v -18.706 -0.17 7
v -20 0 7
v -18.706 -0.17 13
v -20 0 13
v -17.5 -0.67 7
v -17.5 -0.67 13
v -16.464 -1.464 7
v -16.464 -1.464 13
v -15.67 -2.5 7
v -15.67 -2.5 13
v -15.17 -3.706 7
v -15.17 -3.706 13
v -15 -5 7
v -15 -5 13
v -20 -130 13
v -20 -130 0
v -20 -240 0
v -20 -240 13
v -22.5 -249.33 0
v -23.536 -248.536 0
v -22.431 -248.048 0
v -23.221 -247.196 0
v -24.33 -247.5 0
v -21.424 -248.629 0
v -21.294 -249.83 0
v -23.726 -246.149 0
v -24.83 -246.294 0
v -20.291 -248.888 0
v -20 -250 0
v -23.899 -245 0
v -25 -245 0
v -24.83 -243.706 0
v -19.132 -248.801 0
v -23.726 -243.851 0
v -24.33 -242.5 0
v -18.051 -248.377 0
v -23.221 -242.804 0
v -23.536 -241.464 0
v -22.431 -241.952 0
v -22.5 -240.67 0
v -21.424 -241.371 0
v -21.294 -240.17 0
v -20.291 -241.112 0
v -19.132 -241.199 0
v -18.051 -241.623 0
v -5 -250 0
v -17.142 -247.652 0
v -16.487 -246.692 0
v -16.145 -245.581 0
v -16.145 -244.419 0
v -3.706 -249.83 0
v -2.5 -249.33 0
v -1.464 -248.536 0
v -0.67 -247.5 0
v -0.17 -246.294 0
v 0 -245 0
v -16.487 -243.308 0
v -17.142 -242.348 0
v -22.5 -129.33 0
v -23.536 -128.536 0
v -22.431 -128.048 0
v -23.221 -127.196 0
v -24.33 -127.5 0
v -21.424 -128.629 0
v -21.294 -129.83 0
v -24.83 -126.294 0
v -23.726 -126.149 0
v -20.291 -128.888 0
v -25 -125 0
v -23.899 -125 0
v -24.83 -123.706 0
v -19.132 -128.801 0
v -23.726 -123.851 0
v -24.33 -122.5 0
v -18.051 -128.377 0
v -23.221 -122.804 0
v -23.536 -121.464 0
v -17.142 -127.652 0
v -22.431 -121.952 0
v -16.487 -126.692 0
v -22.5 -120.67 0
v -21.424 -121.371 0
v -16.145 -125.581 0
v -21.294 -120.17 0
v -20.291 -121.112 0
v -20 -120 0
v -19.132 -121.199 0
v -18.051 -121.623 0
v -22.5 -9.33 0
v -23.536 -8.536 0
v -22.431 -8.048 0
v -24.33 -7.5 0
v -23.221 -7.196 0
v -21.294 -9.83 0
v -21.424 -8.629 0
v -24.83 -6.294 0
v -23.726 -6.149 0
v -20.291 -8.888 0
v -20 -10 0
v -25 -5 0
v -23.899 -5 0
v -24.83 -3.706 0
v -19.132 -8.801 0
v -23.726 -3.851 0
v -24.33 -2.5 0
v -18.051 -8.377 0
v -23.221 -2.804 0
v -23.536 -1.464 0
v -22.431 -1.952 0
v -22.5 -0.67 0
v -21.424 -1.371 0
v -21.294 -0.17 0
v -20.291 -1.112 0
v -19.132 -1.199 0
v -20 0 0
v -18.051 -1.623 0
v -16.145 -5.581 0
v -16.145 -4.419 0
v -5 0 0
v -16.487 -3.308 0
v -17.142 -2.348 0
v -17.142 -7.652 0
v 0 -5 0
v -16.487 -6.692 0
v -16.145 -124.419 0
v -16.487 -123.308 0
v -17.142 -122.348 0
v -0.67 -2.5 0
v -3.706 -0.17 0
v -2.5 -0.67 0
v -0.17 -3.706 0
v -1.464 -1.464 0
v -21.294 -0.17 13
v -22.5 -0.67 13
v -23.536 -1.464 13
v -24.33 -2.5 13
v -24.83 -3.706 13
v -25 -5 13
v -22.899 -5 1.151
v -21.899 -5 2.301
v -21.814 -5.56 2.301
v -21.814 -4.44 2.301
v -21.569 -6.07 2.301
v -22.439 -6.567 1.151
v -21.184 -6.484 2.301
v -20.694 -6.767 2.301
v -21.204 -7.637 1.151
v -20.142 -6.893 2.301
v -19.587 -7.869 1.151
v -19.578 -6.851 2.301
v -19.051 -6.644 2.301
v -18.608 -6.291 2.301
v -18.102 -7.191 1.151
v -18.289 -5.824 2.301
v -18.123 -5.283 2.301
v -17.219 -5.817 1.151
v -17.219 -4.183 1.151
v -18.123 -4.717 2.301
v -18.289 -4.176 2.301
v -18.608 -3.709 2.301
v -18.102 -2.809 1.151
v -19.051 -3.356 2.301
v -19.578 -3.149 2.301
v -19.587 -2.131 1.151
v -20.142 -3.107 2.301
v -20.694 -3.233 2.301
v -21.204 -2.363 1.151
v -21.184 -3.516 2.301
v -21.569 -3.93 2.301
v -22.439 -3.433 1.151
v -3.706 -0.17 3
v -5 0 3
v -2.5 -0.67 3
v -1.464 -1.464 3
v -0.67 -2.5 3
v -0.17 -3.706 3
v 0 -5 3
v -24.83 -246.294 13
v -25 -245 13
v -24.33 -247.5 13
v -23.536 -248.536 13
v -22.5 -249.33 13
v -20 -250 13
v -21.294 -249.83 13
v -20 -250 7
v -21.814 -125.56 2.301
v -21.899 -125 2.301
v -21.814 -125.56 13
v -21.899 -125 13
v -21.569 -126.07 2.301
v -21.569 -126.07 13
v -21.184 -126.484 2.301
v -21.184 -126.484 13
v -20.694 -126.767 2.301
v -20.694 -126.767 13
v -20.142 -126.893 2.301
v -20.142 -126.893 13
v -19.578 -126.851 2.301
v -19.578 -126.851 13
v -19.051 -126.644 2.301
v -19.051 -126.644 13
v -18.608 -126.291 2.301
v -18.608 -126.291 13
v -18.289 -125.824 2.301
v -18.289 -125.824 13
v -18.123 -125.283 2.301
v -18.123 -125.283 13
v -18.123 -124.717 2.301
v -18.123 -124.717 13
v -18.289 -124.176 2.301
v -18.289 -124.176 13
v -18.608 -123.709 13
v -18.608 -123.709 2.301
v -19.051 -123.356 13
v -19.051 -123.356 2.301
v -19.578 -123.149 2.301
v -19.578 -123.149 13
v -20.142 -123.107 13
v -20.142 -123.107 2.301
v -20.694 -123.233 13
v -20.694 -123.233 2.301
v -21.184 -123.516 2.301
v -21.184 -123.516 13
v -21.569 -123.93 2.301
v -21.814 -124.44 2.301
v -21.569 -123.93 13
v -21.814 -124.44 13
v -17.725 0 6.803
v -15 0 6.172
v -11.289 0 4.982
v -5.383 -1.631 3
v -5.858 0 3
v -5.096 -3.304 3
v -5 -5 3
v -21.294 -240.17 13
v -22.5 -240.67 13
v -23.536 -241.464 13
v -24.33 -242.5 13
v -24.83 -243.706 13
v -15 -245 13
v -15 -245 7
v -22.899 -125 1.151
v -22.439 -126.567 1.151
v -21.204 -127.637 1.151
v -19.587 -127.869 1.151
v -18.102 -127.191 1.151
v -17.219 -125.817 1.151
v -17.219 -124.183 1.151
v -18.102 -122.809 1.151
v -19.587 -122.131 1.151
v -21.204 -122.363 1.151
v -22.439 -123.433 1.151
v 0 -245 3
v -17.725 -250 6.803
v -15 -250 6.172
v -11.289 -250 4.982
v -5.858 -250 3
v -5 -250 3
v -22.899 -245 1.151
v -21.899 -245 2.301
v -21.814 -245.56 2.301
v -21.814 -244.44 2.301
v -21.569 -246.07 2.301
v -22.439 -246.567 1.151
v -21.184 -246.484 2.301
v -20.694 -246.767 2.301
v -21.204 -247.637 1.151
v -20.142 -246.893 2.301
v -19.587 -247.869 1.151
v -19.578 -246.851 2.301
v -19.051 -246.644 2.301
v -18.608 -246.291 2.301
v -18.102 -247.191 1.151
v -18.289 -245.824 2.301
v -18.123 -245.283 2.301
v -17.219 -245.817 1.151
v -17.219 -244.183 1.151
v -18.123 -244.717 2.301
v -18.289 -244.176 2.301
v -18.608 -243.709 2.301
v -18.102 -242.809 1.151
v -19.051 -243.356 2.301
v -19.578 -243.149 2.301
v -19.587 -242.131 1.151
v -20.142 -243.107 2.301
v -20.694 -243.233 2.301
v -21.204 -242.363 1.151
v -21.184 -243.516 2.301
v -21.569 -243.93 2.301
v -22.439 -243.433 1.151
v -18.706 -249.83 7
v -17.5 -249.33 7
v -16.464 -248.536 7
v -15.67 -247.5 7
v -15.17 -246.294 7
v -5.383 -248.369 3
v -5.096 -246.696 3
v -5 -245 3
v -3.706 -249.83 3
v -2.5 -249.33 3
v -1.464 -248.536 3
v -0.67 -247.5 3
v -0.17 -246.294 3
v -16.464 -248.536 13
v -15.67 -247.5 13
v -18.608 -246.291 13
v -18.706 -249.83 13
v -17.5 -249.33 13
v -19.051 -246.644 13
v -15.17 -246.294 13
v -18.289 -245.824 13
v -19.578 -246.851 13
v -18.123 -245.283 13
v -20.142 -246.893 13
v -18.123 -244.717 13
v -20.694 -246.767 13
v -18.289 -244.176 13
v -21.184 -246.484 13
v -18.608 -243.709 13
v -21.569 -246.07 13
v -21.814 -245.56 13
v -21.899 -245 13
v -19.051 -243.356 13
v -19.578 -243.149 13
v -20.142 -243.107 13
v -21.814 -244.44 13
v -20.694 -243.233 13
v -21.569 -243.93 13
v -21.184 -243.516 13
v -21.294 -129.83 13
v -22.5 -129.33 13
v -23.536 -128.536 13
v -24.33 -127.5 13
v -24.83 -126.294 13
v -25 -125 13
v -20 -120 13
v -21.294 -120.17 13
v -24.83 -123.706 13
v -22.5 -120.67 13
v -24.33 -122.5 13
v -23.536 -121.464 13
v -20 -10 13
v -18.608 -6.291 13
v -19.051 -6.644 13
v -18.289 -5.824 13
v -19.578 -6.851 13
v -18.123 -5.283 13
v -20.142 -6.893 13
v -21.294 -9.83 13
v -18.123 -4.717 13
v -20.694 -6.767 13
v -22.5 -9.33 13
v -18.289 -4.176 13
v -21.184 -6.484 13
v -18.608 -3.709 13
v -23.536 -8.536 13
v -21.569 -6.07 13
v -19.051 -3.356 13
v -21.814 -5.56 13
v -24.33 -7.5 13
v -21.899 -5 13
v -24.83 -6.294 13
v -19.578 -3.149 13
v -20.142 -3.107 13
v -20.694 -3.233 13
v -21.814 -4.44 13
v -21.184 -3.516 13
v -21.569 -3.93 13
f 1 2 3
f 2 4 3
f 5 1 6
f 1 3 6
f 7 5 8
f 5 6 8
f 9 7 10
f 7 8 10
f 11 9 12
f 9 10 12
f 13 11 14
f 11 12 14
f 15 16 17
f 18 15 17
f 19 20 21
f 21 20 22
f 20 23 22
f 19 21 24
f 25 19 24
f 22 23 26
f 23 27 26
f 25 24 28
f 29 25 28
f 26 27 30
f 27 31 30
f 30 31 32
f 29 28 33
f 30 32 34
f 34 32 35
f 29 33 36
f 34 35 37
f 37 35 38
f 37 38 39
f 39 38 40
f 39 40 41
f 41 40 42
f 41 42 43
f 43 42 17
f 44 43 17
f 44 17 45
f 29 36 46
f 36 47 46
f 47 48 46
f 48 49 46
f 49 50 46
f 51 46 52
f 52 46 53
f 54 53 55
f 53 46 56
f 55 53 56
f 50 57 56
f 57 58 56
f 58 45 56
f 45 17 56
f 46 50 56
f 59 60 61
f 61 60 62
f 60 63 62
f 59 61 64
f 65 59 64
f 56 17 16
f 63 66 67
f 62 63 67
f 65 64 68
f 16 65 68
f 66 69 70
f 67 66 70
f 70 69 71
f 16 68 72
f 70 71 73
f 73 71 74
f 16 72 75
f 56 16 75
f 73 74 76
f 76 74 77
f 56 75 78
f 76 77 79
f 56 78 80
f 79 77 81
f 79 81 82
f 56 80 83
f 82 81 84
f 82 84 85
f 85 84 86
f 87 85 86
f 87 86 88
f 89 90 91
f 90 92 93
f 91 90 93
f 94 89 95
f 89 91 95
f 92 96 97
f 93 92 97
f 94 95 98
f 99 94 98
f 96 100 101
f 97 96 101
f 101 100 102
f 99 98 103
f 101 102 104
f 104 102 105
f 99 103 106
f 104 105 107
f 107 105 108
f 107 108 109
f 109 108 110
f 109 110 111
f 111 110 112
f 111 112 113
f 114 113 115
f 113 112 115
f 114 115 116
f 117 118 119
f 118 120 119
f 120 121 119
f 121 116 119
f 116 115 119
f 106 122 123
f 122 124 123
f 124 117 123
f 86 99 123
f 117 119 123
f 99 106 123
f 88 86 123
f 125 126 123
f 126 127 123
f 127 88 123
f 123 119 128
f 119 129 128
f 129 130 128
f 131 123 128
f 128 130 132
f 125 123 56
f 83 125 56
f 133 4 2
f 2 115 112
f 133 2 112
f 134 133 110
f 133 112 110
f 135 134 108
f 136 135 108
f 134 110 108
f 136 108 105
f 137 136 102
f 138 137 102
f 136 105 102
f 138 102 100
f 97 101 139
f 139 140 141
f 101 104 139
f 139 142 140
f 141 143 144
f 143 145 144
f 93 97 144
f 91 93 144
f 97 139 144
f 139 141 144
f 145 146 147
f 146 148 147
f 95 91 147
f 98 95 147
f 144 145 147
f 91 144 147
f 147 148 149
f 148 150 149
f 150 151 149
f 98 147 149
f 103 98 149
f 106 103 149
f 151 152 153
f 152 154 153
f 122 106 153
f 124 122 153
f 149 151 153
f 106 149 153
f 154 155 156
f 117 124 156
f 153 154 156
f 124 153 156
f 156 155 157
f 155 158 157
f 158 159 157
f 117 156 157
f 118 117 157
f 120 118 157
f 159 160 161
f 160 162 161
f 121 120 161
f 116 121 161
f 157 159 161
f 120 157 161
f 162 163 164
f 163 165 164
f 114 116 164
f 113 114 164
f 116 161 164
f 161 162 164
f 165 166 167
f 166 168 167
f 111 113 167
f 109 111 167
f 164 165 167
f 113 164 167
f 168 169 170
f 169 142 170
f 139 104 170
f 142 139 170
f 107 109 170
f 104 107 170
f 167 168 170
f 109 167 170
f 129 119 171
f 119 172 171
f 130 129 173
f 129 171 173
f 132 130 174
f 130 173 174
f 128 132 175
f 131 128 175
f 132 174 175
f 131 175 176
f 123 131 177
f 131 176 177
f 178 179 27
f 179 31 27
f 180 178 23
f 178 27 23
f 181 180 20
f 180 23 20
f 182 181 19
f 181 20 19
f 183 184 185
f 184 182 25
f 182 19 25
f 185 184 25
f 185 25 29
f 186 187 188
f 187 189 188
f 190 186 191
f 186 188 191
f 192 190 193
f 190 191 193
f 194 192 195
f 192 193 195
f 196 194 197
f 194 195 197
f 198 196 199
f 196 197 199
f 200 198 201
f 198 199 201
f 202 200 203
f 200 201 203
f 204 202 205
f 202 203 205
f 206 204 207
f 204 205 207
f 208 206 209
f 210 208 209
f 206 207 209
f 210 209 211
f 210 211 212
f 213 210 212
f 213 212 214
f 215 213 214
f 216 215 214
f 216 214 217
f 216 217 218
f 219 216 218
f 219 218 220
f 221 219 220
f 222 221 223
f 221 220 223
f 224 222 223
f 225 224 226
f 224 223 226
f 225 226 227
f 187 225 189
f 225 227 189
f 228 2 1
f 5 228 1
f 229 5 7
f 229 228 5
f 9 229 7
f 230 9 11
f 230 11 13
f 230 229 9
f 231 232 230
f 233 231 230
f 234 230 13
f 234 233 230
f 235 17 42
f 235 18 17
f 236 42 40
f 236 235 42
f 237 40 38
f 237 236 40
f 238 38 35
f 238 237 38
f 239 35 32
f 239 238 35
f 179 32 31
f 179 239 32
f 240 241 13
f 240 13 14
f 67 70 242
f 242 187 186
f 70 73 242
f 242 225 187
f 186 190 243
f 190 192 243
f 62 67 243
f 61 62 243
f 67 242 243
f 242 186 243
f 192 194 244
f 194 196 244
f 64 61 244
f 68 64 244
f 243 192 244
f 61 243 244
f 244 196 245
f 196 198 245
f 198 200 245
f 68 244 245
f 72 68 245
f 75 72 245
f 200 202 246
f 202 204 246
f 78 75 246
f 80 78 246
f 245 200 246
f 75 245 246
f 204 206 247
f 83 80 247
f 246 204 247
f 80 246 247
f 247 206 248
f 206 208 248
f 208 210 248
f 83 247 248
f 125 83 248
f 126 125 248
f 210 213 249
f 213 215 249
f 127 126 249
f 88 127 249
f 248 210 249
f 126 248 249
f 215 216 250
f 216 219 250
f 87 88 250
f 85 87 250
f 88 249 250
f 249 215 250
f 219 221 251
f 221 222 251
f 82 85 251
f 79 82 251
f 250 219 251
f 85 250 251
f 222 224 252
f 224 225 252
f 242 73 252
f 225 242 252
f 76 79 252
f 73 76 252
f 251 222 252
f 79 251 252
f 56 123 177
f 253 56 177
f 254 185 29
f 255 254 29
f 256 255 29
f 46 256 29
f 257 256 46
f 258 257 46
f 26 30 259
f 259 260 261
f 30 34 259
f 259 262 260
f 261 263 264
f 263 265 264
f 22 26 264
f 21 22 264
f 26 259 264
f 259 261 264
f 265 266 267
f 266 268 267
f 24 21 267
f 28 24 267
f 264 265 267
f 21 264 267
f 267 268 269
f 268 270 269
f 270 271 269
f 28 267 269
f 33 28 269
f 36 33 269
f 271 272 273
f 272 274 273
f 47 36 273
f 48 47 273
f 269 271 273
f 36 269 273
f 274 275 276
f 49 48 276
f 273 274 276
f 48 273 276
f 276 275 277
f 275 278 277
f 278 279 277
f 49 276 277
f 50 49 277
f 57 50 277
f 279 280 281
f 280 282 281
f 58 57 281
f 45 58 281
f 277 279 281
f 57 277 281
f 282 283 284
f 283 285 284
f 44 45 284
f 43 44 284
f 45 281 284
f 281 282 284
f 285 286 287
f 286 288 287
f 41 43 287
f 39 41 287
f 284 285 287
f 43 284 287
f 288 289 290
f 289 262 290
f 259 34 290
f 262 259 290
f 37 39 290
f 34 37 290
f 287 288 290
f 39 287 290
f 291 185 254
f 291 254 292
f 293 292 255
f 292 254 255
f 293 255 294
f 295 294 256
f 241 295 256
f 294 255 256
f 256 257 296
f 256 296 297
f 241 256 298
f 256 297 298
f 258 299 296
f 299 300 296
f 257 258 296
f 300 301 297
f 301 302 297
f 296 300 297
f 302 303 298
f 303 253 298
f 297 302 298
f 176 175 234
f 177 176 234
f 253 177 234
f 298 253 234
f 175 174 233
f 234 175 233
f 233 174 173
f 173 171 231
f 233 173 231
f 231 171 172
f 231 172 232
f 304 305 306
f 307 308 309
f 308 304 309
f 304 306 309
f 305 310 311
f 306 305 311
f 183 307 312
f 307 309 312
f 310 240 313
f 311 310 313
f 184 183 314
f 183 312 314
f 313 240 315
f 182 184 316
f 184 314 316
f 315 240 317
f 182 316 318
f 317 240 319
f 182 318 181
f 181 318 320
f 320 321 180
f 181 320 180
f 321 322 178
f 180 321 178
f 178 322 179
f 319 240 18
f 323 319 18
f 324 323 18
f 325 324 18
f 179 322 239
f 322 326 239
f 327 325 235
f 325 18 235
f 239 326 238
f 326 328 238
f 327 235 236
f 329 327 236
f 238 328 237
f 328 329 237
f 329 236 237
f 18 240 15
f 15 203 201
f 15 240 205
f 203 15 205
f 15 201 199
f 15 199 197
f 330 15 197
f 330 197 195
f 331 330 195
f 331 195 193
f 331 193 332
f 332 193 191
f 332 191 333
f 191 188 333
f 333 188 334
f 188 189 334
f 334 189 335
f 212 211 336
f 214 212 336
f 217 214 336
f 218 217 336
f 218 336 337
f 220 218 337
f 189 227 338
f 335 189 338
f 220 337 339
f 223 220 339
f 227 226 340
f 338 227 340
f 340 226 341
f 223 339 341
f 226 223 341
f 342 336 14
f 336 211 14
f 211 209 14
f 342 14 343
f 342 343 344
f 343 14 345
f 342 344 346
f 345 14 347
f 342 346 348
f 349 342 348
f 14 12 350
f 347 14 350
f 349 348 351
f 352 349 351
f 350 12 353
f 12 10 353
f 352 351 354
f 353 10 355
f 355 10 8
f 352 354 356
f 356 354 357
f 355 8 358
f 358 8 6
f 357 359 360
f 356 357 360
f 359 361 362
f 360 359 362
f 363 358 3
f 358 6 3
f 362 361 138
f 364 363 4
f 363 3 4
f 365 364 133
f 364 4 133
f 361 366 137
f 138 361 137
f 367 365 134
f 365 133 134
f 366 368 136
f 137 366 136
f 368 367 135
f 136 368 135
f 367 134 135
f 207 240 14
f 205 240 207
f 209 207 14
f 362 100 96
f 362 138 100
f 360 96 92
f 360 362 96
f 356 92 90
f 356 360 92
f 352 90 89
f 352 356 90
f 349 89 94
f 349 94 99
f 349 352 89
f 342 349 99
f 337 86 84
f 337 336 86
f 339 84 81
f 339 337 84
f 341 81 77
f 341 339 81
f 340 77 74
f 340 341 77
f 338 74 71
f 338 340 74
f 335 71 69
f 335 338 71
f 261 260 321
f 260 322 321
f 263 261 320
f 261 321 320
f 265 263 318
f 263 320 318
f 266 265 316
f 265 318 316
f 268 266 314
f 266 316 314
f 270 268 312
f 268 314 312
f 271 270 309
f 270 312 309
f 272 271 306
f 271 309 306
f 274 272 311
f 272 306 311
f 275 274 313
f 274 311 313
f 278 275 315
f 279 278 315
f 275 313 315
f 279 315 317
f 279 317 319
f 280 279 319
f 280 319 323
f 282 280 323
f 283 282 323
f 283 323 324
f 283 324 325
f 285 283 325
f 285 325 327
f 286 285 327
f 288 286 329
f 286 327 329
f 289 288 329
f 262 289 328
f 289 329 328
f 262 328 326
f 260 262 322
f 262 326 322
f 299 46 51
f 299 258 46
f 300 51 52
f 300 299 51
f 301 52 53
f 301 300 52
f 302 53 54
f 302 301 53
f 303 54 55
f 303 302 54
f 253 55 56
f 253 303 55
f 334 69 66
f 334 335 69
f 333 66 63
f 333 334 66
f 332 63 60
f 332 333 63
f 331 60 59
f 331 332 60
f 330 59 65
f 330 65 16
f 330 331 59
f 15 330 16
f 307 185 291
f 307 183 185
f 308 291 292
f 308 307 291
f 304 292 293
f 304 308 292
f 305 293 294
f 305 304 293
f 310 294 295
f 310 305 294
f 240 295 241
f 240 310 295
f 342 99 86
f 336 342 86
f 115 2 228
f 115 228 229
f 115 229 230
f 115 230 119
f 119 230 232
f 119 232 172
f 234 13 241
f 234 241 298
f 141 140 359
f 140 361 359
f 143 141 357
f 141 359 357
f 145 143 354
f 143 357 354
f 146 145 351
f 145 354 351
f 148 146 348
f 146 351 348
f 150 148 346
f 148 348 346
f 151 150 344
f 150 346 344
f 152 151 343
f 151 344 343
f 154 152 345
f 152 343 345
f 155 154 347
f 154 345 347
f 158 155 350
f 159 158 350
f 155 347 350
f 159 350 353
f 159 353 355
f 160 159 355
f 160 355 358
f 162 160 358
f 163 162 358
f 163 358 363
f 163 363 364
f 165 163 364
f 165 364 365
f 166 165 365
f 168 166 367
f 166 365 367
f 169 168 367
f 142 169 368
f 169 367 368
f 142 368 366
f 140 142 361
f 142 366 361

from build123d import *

# Parameters (mm, degrees)
F1_DEPTH       = 250
F3_D           = 3.7973
F3_CSINK_D     = 7.7978
F3_CSINK_ANGLE = 82
F2_W           = 5
F2_H           = 110
F4_DEPTH       = 13.001
F5_R           = 4.99999
F6_T1_DEPTH    = 240.00002
F6_T6_ANGLE    = 359.64
F6_T12_ANGLE   = 359.64


# Not quite as in the source:
# - a fillet or chamfer that OpenCascade refuses, or shapes differently, is made with other operations: its cross-section is extruded or revolved along the edge and cut away or added
# - a fillet or chamfer is up to 0.001 mm smaller than in the source, because OpenCascade refuses the exact size


with BuildPart() as f1:
    # F0 (on Front) → F1 (new body)
    with BuildSketch(Plane.XZ):
        Polygon((-15, 13), (-25, 13), (-25, 0), (0, 0), (0, 3), (-15, 3), align=None)
    extrude(amount=F1_DEPTH)

    # F3 (through all)
    with Locations(Plane(origin=(0, 0, 0), x_dir=(1, 0, 0), z_dir=(0, 0, -1))):
        with Locations((-20, 245), (-20, 125), (-20, 5)):
            CounterSinkHole(F3_D / 2, F3_CSINK_D / 2, counter_sink_angle=F3_CSINK_ANGLE)

    # F2 (on face) → F4 (cut, through all)
    with BuildSketch(Plane(origin=(0, 0, 0), x_dir=(1, 0, 0), z_dir=(0, 0, -1))):
        with Locations((-22.5, 185)):
            Rectangle(F2_W, F2_H)
        with Locations((-22.5, 65)):
            Rectangle(F2_W, F2_H)
    extrude(amount=-F4_DEPTH, mode=Mode.SUBTRACT)

    # F5 (radius 5 in the source; OpenCascade refuses exactly that, so slightly less here)
    f5_edges = [f1.edges().sort_by_distance(p)[0] for p in [
        (-25, 0, 6.5),
        (-25, -10, 6.5),
        (-25, -120, 6.5),
        (-25, -130, 6.5),
        (-25, -240, 6.5),
        (-25, -250, 6.5),
        (-15, -250, 8),
        (0, -250, 1.5),
        (-15, 0, 8),
        (0, 0, 1.5),
    ]]
    fillet(f5_edges, radius=F5_R)

    # F6: chamfer of 4 x 10 on 1 edges, made by hand

    # F6_s2 → F6_t1 (join)
    with BuildSketch(Plane.XZ.offset(4.99999)):
        Polygon((-15, 7), (-5, 3), (-15, 3), align=None)
    extrude(amount=F6_T1_DEPTH)


with BuildPart() as f6_tool4:
    # F6_s5 → F6_t6 (revolve)
    with BuildSketch(Plane(origin=(-0.0322045944, -5.1254529469, 0), x_dir=(0, 0, 1), z_dir=(0.006283144, 0.9999802609, 0))):
        Polygon((7, -14.9681895603), (3, -4.9681895603), (3, -14.9681895603), align=None)
    revolve(axis=Axis((-19.99999, -4.99999, 3), (0, 0, -1)), revolution_arc=F6_T6_ANGLE)

    split(bisect_by=Plane.XZ, keep=Keep.TOP)

    split(bisect_by=Plane.YZ.offset(-20), keep=Keep.TOP)


with BuildPart() as f1_1:
    add(f1.part)

    # F6_t3: union F6_tool4
    add(f6_tool4.part)


with BuildPart() as f6_tool10:
    # F6_s11 → F6_t12 (revolve)
    with BuildSketch(Plane(origin=(1.538550391, -244.8646775786, 0), x_dir=(0, 0, 1), z_dir=(0.006283144, -0.9999802609, 0))):
        Polygon((7, 16.5389755517), (3, 6.5389755517), (3, 16.5389755517), align=None)
    revolve(axis=Axis((-19.99999, -245.00001, 3), (0, 0, 1)), revolution_arc=F6_T12_ANGLE)

    split(bisect_by=Plane.XZ.offset(250), keep=Keep.BOTTOM)

    split(bisect_by=Plane.YZ.offset(-20), keep=Keep.TOP)


with BuildPart() as f1_2:
    add(f1_1.part)

    # F6_t9: union F6_tool10
    add(f6_tool10.part)


solid = f1_2.part
